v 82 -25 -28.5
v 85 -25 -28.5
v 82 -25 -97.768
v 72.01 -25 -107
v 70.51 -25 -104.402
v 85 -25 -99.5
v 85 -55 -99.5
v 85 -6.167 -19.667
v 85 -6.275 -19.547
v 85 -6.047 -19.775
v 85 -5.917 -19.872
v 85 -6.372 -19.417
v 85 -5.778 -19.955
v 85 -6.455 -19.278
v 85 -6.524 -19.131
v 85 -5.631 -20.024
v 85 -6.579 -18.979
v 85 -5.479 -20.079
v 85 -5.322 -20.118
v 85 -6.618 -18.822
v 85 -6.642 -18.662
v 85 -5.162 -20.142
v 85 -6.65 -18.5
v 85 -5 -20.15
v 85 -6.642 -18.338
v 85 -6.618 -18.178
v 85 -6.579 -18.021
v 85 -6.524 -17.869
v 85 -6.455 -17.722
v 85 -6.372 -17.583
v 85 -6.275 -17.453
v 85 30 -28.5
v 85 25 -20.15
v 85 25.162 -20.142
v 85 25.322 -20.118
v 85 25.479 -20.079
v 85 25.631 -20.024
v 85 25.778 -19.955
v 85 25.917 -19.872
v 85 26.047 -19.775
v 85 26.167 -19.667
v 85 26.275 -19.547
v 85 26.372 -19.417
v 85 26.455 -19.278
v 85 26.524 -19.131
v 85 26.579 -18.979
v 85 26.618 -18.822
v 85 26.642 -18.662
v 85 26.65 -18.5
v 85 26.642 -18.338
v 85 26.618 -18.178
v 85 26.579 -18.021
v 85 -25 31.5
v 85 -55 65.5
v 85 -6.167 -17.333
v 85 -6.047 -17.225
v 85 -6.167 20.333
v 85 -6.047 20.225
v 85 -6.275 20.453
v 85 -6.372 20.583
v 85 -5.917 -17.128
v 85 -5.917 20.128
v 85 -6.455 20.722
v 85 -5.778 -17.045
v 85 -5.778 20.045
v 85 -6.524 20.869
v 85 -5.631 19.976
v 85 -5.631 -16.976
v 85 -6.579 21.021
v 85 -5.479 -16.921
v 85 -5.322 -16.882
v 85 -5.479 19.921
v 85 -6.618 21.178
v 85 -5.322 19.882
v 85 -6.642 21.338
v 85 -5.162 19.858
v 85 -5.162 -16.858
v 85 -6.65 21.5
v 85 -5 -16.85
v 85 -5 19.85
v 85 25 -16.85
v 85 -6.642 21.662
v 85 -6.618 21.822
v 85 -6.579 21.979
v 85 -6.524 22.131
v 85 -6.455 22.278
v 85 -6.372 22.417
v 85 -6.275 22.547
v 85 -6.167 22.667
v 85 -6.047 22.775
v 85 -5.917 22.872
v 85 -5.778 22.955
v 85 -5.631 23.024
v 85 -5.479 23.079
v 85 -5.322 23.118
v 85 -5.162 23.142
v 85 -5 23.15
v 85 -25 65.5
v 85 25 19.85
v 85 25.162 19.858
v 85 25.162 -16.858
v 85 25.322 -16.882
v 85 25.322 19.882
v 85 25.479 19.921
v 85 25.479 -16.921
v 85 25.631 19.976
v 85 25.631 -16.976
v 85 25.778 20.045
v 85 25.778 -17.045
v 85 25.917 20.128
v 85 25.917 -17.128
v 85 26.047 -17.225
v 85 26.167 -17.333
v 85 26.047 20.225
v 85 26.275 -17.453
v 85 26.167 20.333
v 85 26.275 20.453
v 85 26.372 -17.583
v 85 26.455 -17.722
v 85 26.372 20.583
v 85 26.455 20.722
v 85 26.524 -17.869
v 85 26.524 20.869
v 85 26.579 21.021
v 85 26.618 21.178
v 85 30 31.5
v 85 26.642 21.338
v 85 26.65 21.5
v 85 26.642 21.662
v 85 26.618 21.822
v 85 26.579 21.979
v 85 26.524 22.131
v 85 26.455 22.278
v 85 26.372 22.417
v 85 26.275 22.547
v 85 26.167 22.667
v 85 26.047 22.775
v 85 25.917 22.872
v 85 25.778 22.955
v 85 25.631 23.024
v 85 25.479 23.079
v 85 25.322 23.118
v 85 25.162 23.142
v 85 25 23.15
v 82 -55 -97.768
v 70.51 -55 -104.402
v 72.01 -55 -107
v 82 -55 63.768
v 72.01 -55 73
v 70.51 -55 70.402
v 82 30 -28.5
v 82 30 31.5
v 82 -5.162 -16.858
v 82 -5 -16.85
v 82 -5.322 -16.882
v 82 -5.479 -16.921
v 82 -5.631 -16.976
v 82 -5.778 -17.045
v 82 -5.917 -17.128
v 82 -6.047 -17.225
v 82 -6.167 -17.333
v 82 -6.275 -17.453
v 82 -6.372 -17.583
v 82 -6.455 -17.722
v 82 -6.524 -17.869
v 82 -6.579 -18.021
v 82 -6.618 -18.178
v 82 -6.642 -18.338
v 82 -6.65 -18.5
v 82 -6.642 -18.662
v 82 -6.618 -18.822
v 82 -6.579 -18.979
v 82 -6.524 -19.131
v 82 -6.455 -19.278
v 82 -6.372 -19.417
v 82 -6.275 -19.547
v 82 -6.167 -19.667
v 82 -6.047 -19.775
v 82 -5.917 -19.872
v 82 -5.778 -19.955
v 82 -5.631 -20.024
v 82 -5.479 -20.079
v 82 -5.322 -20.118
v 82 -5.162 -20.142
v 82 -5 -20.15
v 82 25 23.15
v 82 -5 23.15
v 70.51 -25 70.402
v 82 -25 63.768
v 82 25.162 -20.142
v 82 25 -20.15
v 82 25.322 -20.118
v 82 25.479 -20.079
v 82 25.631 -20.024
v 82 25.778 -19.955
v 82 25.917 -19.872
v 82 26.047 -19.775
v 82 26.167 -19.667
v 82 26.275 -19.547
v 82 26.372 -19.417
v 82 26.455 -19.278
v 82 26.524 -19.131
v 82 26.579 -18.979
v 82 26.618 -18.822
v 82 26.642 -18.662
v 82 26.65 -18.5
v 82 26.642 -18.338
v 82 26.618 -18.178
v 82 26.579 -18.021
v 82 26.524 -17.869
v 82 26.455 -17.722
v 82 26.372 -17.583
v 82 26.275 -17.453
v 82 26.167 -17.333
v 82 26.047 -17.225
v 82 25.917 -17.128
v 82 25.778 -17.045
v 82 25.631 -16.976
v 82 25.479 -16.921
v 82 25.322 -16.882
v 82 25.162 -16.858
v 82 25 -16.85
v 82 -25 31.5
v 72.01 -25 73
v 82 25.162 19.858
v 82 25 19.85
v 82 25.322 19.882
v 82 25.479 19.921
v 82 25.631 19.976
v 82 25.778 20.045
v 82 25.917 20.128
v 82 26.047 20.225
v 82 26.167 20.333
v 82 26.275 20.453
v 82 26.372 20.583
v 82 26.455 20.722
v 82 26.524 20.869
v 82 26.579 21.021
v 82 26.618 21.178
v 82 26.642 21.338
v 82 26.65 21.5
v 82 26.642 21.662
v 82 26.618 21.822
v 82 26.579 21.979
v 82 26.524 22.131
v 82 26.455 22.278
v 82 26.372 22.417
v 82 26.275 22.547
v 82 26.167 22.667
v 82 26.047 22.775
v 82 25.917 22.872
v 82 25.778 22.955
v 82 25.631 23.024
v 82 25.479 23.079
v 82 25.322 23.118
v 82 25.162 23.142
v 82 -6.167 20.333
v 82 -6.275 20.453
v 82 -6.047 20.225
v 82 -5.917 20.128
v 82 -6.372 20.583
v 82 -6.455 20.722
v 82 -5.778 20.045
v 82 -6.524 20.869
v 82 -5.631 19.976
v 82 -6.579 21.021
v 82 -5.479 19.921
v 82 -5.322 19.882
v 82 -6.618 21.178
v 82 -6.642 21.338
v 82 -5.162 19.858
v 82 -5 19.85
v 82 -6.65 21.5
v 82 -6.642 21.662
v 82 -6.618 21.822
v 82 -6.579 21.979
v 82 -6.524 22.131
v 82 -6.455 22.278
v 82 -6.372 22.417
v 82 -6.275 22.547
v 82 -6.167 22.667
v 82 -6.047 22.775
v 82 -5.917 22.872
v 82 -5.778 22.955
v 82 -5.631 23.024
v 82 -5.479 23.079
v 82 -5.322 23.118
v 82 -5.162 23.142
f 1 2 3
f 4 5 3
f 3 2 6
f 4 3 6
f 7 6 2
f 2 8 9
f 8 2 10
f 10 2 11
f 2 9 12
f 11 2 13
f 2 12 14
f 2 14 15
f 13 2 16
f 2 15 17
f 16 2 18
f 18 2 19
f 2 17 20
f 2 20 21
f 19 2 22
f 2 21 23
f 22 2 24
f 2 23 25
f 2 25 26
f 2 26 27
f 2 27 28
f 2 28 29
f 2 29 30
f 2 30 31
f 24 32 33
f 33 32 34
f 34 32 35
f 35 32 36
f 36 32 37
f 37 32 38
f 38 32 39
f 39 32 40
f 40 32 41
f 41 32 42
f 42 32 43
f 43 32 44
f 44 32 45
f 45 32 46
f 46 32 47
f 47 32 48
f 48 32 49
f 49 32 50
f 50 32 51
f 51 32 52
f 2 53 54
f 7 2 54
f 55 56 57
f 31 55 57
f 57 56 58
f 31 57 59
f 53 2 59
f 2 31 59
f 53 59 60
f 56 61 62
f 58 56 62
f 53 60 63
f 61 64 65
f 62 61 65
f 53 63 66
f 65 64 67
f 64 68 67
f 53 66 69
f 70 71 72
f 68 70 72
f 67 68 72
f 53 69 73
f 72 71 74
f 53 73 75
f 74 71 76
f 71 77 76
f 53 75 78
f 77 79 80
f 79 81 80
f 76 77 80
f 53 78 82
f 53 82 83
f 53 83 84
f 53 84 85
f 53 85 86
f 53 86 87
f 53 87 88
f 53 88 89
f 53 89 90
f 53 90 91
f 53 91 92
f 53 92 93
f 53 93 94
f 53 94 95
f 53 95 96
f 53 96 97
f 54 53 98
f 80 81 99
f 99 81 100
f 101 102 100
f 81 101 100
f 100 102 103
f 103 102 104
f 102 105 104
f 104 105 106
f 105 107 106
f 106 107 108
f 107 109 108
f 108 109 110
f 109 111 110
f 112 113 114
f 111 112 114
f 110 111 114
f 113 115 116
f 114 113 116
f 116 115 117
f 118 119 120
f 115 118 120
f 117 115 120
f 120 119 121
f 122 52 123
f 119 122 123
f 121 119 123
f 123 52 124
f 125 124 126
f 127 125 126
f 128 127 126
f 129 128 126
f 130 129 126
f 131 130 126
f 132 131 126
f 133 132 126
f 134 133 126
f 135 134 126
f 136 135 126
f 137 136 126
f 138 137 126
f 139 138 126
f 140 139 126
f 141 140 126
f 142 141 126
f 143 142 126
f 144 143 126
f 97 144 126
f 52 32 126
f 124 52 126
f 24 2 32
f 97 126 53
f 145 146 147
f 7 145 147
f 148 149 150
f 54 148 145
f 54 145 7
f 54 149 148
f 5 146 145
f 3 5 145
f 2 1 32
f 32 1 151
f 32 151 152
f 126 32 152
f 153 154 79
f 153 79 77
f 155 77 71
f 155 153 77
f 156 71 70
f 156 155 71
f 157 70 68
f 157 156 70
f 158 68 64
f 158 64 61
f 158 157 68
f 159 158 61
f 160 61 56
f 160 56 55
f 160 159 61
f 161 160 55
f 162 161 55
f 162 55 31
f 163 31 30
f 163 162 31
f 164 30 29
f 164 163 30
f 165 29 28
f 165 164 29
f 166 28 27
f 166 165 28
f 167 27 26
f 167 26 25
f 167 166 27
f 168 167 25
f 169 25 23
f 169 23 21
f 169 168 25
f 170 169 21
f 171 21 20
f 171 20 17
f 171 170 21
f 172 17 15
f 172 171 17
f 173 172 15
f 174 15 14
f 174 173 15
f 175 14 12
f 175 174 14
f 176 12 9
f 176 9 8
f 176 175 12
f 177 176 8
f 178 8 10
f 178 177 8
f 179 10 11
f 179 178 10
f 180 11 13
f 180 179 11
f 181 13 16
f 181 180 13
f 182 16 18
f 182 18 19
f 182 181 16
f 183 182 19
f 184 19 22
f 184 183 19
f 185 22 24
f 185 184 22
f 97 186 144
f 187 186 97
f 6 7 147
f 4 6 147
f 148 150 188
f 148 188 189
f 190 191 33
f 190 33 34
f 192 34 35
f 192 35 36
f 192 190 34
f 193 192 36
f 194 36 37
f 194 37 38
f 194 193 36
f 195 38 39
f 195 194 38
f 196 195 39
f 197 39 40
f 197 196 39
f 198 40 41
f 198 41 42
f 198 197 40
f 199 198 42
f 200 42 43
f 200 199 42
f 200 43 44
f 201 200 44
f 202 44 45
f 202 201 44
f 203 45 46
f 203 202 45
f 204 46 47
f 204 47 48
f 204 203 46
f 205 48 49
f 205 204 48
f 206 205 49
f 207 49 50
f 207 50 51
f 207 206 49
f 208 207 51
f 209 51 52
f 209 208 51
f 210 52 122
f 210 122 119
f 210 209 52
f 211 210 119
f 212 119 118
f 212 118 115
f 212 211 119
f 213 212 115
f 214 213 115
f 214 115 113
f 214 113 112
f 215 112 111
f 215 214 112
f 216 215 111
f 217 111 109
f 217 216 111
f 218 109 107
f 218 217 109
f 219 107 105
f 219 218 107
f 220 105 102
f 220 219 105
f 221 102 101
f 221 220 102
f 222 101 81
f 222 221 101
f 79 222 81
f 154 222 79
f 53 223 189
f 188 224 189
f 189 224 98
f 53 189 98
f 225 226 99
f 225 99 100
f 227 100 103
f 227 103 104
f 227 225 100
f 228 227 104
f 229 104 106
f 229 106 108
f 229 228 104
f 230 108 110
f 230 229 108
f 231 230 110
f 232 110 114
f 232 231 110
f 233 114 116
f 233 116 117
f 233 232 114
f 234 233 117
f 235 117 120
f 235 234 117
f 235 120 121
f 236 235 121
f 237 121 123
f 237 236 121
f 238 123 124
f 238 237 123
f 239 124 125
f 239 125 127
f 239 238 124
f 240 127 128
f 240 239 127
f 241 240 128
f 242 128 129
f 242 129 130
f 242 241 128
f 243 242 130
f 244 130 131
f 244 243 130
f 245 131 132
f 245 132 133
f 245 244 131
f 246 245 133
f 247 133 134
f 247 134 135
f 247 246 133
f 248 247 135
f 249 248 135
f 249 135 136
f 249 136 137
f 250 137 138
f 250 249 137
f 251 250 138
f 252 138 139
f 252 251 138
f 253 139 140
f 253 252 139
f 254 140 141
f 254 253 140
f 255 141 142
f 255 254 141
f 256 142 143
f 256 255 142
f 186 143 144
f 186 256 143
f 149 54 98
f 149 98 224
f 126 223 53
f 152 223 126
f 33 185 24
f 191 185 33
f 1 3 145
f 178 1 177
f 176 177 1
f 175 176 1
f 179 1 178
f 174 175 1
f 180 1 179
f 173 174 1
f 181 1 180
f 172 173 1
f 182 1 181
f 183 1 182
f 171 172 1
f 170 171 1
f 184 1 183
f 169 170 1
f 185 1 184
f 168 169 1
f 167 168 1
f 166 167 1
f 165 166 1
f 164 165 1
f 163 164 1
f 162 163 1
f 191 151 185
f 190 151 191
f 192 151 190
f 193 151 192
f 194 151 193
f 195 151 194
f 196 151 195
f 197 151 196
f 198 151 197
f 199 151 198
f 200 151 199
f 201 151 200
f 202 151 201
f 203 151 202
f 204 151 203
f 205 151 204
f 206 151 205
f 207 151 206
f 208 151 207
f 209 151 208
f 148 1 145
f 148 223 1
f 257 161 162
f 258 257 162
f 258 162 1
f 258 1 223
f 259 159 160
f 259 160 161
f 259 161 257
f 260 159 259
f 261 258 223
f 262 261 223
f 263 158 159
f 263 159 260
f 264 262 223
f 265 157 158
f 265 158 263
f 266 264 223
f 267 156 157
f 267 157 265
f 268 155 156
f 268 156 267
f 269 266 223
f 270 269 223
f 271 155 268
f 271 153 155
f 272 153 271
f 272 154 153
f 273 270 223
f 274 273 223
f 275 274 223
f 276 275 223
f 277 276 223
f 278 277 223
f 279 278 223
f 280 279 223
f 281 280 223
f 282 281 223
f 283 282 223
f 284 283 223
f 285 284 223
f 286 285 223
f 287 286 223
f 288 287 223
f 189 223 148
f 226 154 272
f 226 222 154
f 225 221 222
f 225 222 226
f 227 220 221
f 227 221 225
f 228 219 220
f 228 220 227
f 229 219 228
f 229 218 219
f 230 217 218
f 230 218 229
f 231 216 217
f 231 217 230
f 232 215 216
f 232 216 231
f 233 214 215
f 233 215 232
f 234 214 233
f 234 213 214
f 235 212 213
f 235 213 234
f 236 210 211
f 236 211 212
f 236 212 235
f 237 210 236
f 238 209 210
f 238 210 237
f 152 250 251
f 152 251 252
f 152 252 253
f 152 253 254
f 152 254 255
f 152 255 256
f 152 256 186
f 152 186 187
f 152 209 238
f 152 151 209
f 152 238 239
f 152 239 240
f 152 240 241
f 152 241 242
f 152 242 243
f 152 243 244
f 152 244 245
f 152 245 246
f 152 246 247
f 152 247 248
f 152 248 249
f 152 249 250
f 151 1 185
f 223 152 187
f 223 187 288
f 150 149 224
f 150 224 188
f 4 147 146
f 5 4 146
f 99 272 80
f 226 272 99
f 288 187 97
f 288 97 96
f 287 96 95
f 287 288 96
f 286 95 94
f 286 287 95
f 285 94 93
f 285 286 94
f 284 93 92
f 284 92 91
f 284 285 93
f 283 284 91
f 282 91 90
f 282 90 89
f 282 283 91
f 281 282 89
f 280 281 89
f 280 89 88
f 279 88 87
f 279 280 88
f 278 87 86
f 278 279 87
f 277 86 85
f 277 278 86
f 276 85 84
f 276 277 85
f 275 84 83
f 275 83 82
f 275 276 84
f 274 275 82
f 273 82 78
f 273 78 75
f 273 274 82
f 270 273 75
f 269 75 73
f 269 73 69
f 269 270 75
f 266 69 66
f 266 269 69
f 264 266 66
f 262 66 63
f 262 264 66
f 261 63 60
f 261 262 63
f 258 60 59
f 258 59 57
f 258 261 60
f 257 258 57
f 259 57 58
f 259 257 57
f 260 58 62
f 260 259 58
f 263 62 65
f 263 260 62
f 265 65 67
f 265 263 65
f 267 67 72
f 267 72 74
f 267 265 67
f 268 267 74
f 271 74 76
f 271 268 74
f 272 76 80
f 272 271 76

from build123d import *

# Parameters (mm, degrees)
ESQUISSE1_W                         = 85
ESQUISSE1_H                         = 10
ESQUISSE1_R                         = 1
BOSS_EXTRU_1_DEPTH                  = 3
ESQUISSE2_W                         = 165
ESQUISSE2_H                         = 65
BOSS_EXTRU_2_DEPTH                  = 3
ENL_V_MAT_EXTRU_1_REACH             = 87
ESQUISSE3_W                         = 34
ESQUISSE3_H                         = 35
ESQUISSE3_W_2                       = 71
BOSS_EXTRU_3_DEPTH                  = 10
BOSS_EXTRU_5_DEPTH                  = 30
ENL_V_MAT_EXTRU_2_REACH             = 87
ESQUISSE8_R                         = 1.65
ENL_V_MAT_EXTRU_2_DIRECTION_2_DEPTH = 1
ENL_V_MAT_EXTRU_3_DEPTH             = 8
ESQUISSE12_W                        = 95.226934881
ESQUISSE12_H                        = 85.849602385
ENL_V_MAT_EXTRU_4_DEPTH             = 66
ESQUISSE13_W                        = 60
ESQUISSE13_H                        = 20
BOSS_EXTRU_6_DEPTH                  = 3
ENL_V_MAT_EXTRU_5_DEPTH             = 3


with BuildPart() as part:
    # Esquisse1 → Boss.-Extru.1 (new body)
    with BuildSketch(Plane.XY):
        with Locations((42.5, 5)):
            Rectangle(ESQUISSE1_W, ESQUISSE1_H)
        with Locations((5, 5)):
            Circle(ESQUISSE1_R, mode=Mode.SUBTRACT)
    extrude(amount=BOSS_EXTRU_1_DEPTH)

    # Esquisse2 → Boss.-Extru.2 (add)
    with BuildSketch(Plane(origin=(85, 0, 0), x_dir=(0, 0, -1), z_dir=(1, 0, 0))):
        with Locations((17, -22.5)):
            Rectangle(ESQUISSE2_W, ESQUISSE2_H)
    extrude(amount=-BOSS_EXTRU_2_DEPTH)

    # Esquisse3 → Enlèv. mat.-Extru.1 (cut, up to next)
    with BuildSketch(Plane(origin=(85, 0, 0), x_dir=(0, 0, -1), z_dir=(1, 0, 0)), mode=Mode.PRIVATE) as enl_v_mat_extru_1_sk1:
        with Locations((-48.5, -7.5)):
            Rectangle(ESQUISSE3_W, ESQUISSE3_H)
    enl_v_mat_extru_1_tool1 = extrude(enl_v_mat_extru_1_sk1.sketch, amount=-ENL_V_MAT_EXTRU_1_REACH, mode=Mode.PRIVATE) & part.part
    add(enl_v_mat_extru_1_tool1.solids().sort_by_distance((85, -7.5, 48.5))[0], mode=Mode.SUBTRACT)
    # Esquisse3 → Enlèv. mat.-Extru.1 (cut, up to next)
    with BuildSketch(Plane(origin=(85, 0, 0), x_dir=(0, 0, -1), z_dir=(1, 0, 0)), mode=Mode.PRIVATE) as enl_v_mat_extru_1_sk2:
        with Locations((64, -7.5)):
            Rectangle(ESQUISSE3_W_2, ESQUISSE3_H)
    enl_v_mat_extru_1_tool2 = extrude(enl_v_mat_extru_1_sk2.sketch, amount=-ENL_V_MAT_EXTRU_1_REACH, mode=Mode.PRIVATE) & part.part
    add(enl_v_mat_extru_1_tool2.solids().sort_by_distance((85, -7.5, -64))[0], mode=Mode.SUBTRACT)

    # Esquisse5 → Boss.-Extru.3 (add)
    with BuildSketch(Plane(origin=(0, 10, 0), x_dir=(1, 0, 0), z_dir=(0, 1, 0))):
        Polygon((63.707714548, 0), (82, 28.5), (82, 0), align=None)
        Polygon((63.707714548, -3), (82, -3), (82, -31.5), align=None)
    extrude(amount=-BOSS_EXTRU_3_DEPTH)

    # Esquisse7 → Boss.-Extru.5 (add)
    with BuildSketch(Plane.XZ.offset(55)):
        Polygon((85, 65.5), (72.009618943, 73), (70.509618943, 70.401923789), (82, 63.767949192), align=None)
        Polygon((70.509618943, -104.401923789), (82, -97.767949192), (85, -99.5), (72.009618943, -107), align=None)
    extrude(amount=-BOSS_EXTRU_5_DEPTH)

    # Esquisse8 → Enlèv. mat.-Extru.2 (cut, up to next)
    with BuildSketch(Plane(origin=(85, 0, 0), x_dir=(0, 0, -1), z_dir=(1, 0, 0)), mode=Mode.PRIVATE) as enl_v_mat_extru_2_sk1:
        with Locations((-21.5, 5)):
            Circle(ESQUISSE8_R)
    enl_v_mat_extru_2_tool1 = extrude(enl_v_mat_extru_2_sk1.sketch, amount=-ENL_V_MAT_EXTRU_2_REACH, mode=Mode.PRIVATE) & part.part
    add(enl_v_mat_extru_2_tool1.solids().sort_by_distance((85, 5, 21.5))[0], mode=Mode.SUBTRACT)
    # Esquisse8 → Enlèv. mat.-Extru.2 (cut, up to next)
    with BuildSketch(Plane(origin=(85, 0, 0), x_dir=(0, 0, -1), z_dir=(1, 0, 0)), mode=Mode.PRIVATE) as enl_v_mat_extru_2_sk2:
        with Locations((18.5, 5)):
            Circle(ESQUISSE8_R)
    enl_v_mat_extru_2_tool2 = extrude(enl_v_mat_extru_2_sk2.sketch, amount=-ENL_V_MAT_EXTRU_2_REACH, mode=Mode.PRIVATE) & part.part
    add(enl_v_mat_extru_2_tool2.solids().sort_by_distance((85, 5, -18.5))[0], mode=Mode.SUBTRACT)

    # Esquisse8 → Enlèv. mat.-Extru.2 direction 2 (cut)
    with BuildSketch(Plane(origin=(85, 0, 0), x_dir=(0, 0, -1), z_dir=(1, 0, 0))):
        with Locations((-21.5, 5)):
            Circle(ESQUISSE8_R)
        with Locations((18.5, 5)):
            Circle(ESQUISSE8_R)
    extrude(amount=ENL_V_MAT_EXTRU_2_DIRECTION_2_DEPTH, mode=Mode.SUBTRACT)

    # Esquisse9 → Enlèv. mat.-Extru.3 (cut)
    with BuildSketch(Plane.ZY.offset(-72)):
        Polygon((-16.854551733, 7.85), (-20.145448267, 7.85), (-21.790896534, 5), (-20.145448267, 2.15), (-16.854551733, 2.15), (-15.209103466, 5), align=None)
        Polygon((23.145448267, 7.85), (19.854551733, 7.85), (18.209103466, 5), (19.854551733, 2.15), (23.145448267, 2.15), (24.790896534, 5), align=None)
    extrude(amount=-ENL_V_MAT_EXTRU_3_DEPTH, mode=Mode.SUBTRACT)

    # Esquisse12 → Enlèv. mat.-Extru.4 (cut, through all)
    with BuildSketch(Plane(origin=(0, 10, 0), x_dir=(1, 0, 0), z_dir=(0, 1, 0))):
        with Locations((34.386532559, 2.239892923)):
            Rectangle(ESQUISSE12_W, ESQUISSE12_H)
    extrude(amount=-ENL_V_MAT_EXTRU_4_DEPTH, mode=Mode.SUBTRACT)

    # Esquisse13 → Boss.-Extru.6 (add)
    with BuildSketch(Plane.ZY.offset(-82)):
        with Locations((1.5, 20)):
            Rectangle(ESQUISSE13_W, ESQUISSE13_H)
    extrude(amount=-BOSS_EXTRU_6_DEPTH)

    # Esquisse14 → Enlèv. mat.-Extru.5 (cut)
    with BuildSketch(Plane.ZY.offset(-82)):
        with BuildLine():
            Line((-20.15, -5), (-20.15, 25))
            ThreePointArc((-20.15, 25), (-18.5, 26.65), (-16.85, 25))
            Line((-16.85, 25), (-16.85, -5))
            ThreePointArc((-16.85, -5), (-18.5, -6.65), (-20.15, -5))
        make_face()
        with BuildLine():
            Line((19.85, -5), (19.85, 25))
            ThreePointArc((19.85, 25), (21.5, 26.65), (23.15, 25))
            Line((23.15, 25), (23.15, -5))
            ThreePointArc((23.15, -5), (21.5, -6.65), (19.85, -5))
        make_face()
    extrude(amount=-ENL_V_MAT_EXTRU_5_DEPTH, mode=Mode.SUBTRACT)


solid = part.part
